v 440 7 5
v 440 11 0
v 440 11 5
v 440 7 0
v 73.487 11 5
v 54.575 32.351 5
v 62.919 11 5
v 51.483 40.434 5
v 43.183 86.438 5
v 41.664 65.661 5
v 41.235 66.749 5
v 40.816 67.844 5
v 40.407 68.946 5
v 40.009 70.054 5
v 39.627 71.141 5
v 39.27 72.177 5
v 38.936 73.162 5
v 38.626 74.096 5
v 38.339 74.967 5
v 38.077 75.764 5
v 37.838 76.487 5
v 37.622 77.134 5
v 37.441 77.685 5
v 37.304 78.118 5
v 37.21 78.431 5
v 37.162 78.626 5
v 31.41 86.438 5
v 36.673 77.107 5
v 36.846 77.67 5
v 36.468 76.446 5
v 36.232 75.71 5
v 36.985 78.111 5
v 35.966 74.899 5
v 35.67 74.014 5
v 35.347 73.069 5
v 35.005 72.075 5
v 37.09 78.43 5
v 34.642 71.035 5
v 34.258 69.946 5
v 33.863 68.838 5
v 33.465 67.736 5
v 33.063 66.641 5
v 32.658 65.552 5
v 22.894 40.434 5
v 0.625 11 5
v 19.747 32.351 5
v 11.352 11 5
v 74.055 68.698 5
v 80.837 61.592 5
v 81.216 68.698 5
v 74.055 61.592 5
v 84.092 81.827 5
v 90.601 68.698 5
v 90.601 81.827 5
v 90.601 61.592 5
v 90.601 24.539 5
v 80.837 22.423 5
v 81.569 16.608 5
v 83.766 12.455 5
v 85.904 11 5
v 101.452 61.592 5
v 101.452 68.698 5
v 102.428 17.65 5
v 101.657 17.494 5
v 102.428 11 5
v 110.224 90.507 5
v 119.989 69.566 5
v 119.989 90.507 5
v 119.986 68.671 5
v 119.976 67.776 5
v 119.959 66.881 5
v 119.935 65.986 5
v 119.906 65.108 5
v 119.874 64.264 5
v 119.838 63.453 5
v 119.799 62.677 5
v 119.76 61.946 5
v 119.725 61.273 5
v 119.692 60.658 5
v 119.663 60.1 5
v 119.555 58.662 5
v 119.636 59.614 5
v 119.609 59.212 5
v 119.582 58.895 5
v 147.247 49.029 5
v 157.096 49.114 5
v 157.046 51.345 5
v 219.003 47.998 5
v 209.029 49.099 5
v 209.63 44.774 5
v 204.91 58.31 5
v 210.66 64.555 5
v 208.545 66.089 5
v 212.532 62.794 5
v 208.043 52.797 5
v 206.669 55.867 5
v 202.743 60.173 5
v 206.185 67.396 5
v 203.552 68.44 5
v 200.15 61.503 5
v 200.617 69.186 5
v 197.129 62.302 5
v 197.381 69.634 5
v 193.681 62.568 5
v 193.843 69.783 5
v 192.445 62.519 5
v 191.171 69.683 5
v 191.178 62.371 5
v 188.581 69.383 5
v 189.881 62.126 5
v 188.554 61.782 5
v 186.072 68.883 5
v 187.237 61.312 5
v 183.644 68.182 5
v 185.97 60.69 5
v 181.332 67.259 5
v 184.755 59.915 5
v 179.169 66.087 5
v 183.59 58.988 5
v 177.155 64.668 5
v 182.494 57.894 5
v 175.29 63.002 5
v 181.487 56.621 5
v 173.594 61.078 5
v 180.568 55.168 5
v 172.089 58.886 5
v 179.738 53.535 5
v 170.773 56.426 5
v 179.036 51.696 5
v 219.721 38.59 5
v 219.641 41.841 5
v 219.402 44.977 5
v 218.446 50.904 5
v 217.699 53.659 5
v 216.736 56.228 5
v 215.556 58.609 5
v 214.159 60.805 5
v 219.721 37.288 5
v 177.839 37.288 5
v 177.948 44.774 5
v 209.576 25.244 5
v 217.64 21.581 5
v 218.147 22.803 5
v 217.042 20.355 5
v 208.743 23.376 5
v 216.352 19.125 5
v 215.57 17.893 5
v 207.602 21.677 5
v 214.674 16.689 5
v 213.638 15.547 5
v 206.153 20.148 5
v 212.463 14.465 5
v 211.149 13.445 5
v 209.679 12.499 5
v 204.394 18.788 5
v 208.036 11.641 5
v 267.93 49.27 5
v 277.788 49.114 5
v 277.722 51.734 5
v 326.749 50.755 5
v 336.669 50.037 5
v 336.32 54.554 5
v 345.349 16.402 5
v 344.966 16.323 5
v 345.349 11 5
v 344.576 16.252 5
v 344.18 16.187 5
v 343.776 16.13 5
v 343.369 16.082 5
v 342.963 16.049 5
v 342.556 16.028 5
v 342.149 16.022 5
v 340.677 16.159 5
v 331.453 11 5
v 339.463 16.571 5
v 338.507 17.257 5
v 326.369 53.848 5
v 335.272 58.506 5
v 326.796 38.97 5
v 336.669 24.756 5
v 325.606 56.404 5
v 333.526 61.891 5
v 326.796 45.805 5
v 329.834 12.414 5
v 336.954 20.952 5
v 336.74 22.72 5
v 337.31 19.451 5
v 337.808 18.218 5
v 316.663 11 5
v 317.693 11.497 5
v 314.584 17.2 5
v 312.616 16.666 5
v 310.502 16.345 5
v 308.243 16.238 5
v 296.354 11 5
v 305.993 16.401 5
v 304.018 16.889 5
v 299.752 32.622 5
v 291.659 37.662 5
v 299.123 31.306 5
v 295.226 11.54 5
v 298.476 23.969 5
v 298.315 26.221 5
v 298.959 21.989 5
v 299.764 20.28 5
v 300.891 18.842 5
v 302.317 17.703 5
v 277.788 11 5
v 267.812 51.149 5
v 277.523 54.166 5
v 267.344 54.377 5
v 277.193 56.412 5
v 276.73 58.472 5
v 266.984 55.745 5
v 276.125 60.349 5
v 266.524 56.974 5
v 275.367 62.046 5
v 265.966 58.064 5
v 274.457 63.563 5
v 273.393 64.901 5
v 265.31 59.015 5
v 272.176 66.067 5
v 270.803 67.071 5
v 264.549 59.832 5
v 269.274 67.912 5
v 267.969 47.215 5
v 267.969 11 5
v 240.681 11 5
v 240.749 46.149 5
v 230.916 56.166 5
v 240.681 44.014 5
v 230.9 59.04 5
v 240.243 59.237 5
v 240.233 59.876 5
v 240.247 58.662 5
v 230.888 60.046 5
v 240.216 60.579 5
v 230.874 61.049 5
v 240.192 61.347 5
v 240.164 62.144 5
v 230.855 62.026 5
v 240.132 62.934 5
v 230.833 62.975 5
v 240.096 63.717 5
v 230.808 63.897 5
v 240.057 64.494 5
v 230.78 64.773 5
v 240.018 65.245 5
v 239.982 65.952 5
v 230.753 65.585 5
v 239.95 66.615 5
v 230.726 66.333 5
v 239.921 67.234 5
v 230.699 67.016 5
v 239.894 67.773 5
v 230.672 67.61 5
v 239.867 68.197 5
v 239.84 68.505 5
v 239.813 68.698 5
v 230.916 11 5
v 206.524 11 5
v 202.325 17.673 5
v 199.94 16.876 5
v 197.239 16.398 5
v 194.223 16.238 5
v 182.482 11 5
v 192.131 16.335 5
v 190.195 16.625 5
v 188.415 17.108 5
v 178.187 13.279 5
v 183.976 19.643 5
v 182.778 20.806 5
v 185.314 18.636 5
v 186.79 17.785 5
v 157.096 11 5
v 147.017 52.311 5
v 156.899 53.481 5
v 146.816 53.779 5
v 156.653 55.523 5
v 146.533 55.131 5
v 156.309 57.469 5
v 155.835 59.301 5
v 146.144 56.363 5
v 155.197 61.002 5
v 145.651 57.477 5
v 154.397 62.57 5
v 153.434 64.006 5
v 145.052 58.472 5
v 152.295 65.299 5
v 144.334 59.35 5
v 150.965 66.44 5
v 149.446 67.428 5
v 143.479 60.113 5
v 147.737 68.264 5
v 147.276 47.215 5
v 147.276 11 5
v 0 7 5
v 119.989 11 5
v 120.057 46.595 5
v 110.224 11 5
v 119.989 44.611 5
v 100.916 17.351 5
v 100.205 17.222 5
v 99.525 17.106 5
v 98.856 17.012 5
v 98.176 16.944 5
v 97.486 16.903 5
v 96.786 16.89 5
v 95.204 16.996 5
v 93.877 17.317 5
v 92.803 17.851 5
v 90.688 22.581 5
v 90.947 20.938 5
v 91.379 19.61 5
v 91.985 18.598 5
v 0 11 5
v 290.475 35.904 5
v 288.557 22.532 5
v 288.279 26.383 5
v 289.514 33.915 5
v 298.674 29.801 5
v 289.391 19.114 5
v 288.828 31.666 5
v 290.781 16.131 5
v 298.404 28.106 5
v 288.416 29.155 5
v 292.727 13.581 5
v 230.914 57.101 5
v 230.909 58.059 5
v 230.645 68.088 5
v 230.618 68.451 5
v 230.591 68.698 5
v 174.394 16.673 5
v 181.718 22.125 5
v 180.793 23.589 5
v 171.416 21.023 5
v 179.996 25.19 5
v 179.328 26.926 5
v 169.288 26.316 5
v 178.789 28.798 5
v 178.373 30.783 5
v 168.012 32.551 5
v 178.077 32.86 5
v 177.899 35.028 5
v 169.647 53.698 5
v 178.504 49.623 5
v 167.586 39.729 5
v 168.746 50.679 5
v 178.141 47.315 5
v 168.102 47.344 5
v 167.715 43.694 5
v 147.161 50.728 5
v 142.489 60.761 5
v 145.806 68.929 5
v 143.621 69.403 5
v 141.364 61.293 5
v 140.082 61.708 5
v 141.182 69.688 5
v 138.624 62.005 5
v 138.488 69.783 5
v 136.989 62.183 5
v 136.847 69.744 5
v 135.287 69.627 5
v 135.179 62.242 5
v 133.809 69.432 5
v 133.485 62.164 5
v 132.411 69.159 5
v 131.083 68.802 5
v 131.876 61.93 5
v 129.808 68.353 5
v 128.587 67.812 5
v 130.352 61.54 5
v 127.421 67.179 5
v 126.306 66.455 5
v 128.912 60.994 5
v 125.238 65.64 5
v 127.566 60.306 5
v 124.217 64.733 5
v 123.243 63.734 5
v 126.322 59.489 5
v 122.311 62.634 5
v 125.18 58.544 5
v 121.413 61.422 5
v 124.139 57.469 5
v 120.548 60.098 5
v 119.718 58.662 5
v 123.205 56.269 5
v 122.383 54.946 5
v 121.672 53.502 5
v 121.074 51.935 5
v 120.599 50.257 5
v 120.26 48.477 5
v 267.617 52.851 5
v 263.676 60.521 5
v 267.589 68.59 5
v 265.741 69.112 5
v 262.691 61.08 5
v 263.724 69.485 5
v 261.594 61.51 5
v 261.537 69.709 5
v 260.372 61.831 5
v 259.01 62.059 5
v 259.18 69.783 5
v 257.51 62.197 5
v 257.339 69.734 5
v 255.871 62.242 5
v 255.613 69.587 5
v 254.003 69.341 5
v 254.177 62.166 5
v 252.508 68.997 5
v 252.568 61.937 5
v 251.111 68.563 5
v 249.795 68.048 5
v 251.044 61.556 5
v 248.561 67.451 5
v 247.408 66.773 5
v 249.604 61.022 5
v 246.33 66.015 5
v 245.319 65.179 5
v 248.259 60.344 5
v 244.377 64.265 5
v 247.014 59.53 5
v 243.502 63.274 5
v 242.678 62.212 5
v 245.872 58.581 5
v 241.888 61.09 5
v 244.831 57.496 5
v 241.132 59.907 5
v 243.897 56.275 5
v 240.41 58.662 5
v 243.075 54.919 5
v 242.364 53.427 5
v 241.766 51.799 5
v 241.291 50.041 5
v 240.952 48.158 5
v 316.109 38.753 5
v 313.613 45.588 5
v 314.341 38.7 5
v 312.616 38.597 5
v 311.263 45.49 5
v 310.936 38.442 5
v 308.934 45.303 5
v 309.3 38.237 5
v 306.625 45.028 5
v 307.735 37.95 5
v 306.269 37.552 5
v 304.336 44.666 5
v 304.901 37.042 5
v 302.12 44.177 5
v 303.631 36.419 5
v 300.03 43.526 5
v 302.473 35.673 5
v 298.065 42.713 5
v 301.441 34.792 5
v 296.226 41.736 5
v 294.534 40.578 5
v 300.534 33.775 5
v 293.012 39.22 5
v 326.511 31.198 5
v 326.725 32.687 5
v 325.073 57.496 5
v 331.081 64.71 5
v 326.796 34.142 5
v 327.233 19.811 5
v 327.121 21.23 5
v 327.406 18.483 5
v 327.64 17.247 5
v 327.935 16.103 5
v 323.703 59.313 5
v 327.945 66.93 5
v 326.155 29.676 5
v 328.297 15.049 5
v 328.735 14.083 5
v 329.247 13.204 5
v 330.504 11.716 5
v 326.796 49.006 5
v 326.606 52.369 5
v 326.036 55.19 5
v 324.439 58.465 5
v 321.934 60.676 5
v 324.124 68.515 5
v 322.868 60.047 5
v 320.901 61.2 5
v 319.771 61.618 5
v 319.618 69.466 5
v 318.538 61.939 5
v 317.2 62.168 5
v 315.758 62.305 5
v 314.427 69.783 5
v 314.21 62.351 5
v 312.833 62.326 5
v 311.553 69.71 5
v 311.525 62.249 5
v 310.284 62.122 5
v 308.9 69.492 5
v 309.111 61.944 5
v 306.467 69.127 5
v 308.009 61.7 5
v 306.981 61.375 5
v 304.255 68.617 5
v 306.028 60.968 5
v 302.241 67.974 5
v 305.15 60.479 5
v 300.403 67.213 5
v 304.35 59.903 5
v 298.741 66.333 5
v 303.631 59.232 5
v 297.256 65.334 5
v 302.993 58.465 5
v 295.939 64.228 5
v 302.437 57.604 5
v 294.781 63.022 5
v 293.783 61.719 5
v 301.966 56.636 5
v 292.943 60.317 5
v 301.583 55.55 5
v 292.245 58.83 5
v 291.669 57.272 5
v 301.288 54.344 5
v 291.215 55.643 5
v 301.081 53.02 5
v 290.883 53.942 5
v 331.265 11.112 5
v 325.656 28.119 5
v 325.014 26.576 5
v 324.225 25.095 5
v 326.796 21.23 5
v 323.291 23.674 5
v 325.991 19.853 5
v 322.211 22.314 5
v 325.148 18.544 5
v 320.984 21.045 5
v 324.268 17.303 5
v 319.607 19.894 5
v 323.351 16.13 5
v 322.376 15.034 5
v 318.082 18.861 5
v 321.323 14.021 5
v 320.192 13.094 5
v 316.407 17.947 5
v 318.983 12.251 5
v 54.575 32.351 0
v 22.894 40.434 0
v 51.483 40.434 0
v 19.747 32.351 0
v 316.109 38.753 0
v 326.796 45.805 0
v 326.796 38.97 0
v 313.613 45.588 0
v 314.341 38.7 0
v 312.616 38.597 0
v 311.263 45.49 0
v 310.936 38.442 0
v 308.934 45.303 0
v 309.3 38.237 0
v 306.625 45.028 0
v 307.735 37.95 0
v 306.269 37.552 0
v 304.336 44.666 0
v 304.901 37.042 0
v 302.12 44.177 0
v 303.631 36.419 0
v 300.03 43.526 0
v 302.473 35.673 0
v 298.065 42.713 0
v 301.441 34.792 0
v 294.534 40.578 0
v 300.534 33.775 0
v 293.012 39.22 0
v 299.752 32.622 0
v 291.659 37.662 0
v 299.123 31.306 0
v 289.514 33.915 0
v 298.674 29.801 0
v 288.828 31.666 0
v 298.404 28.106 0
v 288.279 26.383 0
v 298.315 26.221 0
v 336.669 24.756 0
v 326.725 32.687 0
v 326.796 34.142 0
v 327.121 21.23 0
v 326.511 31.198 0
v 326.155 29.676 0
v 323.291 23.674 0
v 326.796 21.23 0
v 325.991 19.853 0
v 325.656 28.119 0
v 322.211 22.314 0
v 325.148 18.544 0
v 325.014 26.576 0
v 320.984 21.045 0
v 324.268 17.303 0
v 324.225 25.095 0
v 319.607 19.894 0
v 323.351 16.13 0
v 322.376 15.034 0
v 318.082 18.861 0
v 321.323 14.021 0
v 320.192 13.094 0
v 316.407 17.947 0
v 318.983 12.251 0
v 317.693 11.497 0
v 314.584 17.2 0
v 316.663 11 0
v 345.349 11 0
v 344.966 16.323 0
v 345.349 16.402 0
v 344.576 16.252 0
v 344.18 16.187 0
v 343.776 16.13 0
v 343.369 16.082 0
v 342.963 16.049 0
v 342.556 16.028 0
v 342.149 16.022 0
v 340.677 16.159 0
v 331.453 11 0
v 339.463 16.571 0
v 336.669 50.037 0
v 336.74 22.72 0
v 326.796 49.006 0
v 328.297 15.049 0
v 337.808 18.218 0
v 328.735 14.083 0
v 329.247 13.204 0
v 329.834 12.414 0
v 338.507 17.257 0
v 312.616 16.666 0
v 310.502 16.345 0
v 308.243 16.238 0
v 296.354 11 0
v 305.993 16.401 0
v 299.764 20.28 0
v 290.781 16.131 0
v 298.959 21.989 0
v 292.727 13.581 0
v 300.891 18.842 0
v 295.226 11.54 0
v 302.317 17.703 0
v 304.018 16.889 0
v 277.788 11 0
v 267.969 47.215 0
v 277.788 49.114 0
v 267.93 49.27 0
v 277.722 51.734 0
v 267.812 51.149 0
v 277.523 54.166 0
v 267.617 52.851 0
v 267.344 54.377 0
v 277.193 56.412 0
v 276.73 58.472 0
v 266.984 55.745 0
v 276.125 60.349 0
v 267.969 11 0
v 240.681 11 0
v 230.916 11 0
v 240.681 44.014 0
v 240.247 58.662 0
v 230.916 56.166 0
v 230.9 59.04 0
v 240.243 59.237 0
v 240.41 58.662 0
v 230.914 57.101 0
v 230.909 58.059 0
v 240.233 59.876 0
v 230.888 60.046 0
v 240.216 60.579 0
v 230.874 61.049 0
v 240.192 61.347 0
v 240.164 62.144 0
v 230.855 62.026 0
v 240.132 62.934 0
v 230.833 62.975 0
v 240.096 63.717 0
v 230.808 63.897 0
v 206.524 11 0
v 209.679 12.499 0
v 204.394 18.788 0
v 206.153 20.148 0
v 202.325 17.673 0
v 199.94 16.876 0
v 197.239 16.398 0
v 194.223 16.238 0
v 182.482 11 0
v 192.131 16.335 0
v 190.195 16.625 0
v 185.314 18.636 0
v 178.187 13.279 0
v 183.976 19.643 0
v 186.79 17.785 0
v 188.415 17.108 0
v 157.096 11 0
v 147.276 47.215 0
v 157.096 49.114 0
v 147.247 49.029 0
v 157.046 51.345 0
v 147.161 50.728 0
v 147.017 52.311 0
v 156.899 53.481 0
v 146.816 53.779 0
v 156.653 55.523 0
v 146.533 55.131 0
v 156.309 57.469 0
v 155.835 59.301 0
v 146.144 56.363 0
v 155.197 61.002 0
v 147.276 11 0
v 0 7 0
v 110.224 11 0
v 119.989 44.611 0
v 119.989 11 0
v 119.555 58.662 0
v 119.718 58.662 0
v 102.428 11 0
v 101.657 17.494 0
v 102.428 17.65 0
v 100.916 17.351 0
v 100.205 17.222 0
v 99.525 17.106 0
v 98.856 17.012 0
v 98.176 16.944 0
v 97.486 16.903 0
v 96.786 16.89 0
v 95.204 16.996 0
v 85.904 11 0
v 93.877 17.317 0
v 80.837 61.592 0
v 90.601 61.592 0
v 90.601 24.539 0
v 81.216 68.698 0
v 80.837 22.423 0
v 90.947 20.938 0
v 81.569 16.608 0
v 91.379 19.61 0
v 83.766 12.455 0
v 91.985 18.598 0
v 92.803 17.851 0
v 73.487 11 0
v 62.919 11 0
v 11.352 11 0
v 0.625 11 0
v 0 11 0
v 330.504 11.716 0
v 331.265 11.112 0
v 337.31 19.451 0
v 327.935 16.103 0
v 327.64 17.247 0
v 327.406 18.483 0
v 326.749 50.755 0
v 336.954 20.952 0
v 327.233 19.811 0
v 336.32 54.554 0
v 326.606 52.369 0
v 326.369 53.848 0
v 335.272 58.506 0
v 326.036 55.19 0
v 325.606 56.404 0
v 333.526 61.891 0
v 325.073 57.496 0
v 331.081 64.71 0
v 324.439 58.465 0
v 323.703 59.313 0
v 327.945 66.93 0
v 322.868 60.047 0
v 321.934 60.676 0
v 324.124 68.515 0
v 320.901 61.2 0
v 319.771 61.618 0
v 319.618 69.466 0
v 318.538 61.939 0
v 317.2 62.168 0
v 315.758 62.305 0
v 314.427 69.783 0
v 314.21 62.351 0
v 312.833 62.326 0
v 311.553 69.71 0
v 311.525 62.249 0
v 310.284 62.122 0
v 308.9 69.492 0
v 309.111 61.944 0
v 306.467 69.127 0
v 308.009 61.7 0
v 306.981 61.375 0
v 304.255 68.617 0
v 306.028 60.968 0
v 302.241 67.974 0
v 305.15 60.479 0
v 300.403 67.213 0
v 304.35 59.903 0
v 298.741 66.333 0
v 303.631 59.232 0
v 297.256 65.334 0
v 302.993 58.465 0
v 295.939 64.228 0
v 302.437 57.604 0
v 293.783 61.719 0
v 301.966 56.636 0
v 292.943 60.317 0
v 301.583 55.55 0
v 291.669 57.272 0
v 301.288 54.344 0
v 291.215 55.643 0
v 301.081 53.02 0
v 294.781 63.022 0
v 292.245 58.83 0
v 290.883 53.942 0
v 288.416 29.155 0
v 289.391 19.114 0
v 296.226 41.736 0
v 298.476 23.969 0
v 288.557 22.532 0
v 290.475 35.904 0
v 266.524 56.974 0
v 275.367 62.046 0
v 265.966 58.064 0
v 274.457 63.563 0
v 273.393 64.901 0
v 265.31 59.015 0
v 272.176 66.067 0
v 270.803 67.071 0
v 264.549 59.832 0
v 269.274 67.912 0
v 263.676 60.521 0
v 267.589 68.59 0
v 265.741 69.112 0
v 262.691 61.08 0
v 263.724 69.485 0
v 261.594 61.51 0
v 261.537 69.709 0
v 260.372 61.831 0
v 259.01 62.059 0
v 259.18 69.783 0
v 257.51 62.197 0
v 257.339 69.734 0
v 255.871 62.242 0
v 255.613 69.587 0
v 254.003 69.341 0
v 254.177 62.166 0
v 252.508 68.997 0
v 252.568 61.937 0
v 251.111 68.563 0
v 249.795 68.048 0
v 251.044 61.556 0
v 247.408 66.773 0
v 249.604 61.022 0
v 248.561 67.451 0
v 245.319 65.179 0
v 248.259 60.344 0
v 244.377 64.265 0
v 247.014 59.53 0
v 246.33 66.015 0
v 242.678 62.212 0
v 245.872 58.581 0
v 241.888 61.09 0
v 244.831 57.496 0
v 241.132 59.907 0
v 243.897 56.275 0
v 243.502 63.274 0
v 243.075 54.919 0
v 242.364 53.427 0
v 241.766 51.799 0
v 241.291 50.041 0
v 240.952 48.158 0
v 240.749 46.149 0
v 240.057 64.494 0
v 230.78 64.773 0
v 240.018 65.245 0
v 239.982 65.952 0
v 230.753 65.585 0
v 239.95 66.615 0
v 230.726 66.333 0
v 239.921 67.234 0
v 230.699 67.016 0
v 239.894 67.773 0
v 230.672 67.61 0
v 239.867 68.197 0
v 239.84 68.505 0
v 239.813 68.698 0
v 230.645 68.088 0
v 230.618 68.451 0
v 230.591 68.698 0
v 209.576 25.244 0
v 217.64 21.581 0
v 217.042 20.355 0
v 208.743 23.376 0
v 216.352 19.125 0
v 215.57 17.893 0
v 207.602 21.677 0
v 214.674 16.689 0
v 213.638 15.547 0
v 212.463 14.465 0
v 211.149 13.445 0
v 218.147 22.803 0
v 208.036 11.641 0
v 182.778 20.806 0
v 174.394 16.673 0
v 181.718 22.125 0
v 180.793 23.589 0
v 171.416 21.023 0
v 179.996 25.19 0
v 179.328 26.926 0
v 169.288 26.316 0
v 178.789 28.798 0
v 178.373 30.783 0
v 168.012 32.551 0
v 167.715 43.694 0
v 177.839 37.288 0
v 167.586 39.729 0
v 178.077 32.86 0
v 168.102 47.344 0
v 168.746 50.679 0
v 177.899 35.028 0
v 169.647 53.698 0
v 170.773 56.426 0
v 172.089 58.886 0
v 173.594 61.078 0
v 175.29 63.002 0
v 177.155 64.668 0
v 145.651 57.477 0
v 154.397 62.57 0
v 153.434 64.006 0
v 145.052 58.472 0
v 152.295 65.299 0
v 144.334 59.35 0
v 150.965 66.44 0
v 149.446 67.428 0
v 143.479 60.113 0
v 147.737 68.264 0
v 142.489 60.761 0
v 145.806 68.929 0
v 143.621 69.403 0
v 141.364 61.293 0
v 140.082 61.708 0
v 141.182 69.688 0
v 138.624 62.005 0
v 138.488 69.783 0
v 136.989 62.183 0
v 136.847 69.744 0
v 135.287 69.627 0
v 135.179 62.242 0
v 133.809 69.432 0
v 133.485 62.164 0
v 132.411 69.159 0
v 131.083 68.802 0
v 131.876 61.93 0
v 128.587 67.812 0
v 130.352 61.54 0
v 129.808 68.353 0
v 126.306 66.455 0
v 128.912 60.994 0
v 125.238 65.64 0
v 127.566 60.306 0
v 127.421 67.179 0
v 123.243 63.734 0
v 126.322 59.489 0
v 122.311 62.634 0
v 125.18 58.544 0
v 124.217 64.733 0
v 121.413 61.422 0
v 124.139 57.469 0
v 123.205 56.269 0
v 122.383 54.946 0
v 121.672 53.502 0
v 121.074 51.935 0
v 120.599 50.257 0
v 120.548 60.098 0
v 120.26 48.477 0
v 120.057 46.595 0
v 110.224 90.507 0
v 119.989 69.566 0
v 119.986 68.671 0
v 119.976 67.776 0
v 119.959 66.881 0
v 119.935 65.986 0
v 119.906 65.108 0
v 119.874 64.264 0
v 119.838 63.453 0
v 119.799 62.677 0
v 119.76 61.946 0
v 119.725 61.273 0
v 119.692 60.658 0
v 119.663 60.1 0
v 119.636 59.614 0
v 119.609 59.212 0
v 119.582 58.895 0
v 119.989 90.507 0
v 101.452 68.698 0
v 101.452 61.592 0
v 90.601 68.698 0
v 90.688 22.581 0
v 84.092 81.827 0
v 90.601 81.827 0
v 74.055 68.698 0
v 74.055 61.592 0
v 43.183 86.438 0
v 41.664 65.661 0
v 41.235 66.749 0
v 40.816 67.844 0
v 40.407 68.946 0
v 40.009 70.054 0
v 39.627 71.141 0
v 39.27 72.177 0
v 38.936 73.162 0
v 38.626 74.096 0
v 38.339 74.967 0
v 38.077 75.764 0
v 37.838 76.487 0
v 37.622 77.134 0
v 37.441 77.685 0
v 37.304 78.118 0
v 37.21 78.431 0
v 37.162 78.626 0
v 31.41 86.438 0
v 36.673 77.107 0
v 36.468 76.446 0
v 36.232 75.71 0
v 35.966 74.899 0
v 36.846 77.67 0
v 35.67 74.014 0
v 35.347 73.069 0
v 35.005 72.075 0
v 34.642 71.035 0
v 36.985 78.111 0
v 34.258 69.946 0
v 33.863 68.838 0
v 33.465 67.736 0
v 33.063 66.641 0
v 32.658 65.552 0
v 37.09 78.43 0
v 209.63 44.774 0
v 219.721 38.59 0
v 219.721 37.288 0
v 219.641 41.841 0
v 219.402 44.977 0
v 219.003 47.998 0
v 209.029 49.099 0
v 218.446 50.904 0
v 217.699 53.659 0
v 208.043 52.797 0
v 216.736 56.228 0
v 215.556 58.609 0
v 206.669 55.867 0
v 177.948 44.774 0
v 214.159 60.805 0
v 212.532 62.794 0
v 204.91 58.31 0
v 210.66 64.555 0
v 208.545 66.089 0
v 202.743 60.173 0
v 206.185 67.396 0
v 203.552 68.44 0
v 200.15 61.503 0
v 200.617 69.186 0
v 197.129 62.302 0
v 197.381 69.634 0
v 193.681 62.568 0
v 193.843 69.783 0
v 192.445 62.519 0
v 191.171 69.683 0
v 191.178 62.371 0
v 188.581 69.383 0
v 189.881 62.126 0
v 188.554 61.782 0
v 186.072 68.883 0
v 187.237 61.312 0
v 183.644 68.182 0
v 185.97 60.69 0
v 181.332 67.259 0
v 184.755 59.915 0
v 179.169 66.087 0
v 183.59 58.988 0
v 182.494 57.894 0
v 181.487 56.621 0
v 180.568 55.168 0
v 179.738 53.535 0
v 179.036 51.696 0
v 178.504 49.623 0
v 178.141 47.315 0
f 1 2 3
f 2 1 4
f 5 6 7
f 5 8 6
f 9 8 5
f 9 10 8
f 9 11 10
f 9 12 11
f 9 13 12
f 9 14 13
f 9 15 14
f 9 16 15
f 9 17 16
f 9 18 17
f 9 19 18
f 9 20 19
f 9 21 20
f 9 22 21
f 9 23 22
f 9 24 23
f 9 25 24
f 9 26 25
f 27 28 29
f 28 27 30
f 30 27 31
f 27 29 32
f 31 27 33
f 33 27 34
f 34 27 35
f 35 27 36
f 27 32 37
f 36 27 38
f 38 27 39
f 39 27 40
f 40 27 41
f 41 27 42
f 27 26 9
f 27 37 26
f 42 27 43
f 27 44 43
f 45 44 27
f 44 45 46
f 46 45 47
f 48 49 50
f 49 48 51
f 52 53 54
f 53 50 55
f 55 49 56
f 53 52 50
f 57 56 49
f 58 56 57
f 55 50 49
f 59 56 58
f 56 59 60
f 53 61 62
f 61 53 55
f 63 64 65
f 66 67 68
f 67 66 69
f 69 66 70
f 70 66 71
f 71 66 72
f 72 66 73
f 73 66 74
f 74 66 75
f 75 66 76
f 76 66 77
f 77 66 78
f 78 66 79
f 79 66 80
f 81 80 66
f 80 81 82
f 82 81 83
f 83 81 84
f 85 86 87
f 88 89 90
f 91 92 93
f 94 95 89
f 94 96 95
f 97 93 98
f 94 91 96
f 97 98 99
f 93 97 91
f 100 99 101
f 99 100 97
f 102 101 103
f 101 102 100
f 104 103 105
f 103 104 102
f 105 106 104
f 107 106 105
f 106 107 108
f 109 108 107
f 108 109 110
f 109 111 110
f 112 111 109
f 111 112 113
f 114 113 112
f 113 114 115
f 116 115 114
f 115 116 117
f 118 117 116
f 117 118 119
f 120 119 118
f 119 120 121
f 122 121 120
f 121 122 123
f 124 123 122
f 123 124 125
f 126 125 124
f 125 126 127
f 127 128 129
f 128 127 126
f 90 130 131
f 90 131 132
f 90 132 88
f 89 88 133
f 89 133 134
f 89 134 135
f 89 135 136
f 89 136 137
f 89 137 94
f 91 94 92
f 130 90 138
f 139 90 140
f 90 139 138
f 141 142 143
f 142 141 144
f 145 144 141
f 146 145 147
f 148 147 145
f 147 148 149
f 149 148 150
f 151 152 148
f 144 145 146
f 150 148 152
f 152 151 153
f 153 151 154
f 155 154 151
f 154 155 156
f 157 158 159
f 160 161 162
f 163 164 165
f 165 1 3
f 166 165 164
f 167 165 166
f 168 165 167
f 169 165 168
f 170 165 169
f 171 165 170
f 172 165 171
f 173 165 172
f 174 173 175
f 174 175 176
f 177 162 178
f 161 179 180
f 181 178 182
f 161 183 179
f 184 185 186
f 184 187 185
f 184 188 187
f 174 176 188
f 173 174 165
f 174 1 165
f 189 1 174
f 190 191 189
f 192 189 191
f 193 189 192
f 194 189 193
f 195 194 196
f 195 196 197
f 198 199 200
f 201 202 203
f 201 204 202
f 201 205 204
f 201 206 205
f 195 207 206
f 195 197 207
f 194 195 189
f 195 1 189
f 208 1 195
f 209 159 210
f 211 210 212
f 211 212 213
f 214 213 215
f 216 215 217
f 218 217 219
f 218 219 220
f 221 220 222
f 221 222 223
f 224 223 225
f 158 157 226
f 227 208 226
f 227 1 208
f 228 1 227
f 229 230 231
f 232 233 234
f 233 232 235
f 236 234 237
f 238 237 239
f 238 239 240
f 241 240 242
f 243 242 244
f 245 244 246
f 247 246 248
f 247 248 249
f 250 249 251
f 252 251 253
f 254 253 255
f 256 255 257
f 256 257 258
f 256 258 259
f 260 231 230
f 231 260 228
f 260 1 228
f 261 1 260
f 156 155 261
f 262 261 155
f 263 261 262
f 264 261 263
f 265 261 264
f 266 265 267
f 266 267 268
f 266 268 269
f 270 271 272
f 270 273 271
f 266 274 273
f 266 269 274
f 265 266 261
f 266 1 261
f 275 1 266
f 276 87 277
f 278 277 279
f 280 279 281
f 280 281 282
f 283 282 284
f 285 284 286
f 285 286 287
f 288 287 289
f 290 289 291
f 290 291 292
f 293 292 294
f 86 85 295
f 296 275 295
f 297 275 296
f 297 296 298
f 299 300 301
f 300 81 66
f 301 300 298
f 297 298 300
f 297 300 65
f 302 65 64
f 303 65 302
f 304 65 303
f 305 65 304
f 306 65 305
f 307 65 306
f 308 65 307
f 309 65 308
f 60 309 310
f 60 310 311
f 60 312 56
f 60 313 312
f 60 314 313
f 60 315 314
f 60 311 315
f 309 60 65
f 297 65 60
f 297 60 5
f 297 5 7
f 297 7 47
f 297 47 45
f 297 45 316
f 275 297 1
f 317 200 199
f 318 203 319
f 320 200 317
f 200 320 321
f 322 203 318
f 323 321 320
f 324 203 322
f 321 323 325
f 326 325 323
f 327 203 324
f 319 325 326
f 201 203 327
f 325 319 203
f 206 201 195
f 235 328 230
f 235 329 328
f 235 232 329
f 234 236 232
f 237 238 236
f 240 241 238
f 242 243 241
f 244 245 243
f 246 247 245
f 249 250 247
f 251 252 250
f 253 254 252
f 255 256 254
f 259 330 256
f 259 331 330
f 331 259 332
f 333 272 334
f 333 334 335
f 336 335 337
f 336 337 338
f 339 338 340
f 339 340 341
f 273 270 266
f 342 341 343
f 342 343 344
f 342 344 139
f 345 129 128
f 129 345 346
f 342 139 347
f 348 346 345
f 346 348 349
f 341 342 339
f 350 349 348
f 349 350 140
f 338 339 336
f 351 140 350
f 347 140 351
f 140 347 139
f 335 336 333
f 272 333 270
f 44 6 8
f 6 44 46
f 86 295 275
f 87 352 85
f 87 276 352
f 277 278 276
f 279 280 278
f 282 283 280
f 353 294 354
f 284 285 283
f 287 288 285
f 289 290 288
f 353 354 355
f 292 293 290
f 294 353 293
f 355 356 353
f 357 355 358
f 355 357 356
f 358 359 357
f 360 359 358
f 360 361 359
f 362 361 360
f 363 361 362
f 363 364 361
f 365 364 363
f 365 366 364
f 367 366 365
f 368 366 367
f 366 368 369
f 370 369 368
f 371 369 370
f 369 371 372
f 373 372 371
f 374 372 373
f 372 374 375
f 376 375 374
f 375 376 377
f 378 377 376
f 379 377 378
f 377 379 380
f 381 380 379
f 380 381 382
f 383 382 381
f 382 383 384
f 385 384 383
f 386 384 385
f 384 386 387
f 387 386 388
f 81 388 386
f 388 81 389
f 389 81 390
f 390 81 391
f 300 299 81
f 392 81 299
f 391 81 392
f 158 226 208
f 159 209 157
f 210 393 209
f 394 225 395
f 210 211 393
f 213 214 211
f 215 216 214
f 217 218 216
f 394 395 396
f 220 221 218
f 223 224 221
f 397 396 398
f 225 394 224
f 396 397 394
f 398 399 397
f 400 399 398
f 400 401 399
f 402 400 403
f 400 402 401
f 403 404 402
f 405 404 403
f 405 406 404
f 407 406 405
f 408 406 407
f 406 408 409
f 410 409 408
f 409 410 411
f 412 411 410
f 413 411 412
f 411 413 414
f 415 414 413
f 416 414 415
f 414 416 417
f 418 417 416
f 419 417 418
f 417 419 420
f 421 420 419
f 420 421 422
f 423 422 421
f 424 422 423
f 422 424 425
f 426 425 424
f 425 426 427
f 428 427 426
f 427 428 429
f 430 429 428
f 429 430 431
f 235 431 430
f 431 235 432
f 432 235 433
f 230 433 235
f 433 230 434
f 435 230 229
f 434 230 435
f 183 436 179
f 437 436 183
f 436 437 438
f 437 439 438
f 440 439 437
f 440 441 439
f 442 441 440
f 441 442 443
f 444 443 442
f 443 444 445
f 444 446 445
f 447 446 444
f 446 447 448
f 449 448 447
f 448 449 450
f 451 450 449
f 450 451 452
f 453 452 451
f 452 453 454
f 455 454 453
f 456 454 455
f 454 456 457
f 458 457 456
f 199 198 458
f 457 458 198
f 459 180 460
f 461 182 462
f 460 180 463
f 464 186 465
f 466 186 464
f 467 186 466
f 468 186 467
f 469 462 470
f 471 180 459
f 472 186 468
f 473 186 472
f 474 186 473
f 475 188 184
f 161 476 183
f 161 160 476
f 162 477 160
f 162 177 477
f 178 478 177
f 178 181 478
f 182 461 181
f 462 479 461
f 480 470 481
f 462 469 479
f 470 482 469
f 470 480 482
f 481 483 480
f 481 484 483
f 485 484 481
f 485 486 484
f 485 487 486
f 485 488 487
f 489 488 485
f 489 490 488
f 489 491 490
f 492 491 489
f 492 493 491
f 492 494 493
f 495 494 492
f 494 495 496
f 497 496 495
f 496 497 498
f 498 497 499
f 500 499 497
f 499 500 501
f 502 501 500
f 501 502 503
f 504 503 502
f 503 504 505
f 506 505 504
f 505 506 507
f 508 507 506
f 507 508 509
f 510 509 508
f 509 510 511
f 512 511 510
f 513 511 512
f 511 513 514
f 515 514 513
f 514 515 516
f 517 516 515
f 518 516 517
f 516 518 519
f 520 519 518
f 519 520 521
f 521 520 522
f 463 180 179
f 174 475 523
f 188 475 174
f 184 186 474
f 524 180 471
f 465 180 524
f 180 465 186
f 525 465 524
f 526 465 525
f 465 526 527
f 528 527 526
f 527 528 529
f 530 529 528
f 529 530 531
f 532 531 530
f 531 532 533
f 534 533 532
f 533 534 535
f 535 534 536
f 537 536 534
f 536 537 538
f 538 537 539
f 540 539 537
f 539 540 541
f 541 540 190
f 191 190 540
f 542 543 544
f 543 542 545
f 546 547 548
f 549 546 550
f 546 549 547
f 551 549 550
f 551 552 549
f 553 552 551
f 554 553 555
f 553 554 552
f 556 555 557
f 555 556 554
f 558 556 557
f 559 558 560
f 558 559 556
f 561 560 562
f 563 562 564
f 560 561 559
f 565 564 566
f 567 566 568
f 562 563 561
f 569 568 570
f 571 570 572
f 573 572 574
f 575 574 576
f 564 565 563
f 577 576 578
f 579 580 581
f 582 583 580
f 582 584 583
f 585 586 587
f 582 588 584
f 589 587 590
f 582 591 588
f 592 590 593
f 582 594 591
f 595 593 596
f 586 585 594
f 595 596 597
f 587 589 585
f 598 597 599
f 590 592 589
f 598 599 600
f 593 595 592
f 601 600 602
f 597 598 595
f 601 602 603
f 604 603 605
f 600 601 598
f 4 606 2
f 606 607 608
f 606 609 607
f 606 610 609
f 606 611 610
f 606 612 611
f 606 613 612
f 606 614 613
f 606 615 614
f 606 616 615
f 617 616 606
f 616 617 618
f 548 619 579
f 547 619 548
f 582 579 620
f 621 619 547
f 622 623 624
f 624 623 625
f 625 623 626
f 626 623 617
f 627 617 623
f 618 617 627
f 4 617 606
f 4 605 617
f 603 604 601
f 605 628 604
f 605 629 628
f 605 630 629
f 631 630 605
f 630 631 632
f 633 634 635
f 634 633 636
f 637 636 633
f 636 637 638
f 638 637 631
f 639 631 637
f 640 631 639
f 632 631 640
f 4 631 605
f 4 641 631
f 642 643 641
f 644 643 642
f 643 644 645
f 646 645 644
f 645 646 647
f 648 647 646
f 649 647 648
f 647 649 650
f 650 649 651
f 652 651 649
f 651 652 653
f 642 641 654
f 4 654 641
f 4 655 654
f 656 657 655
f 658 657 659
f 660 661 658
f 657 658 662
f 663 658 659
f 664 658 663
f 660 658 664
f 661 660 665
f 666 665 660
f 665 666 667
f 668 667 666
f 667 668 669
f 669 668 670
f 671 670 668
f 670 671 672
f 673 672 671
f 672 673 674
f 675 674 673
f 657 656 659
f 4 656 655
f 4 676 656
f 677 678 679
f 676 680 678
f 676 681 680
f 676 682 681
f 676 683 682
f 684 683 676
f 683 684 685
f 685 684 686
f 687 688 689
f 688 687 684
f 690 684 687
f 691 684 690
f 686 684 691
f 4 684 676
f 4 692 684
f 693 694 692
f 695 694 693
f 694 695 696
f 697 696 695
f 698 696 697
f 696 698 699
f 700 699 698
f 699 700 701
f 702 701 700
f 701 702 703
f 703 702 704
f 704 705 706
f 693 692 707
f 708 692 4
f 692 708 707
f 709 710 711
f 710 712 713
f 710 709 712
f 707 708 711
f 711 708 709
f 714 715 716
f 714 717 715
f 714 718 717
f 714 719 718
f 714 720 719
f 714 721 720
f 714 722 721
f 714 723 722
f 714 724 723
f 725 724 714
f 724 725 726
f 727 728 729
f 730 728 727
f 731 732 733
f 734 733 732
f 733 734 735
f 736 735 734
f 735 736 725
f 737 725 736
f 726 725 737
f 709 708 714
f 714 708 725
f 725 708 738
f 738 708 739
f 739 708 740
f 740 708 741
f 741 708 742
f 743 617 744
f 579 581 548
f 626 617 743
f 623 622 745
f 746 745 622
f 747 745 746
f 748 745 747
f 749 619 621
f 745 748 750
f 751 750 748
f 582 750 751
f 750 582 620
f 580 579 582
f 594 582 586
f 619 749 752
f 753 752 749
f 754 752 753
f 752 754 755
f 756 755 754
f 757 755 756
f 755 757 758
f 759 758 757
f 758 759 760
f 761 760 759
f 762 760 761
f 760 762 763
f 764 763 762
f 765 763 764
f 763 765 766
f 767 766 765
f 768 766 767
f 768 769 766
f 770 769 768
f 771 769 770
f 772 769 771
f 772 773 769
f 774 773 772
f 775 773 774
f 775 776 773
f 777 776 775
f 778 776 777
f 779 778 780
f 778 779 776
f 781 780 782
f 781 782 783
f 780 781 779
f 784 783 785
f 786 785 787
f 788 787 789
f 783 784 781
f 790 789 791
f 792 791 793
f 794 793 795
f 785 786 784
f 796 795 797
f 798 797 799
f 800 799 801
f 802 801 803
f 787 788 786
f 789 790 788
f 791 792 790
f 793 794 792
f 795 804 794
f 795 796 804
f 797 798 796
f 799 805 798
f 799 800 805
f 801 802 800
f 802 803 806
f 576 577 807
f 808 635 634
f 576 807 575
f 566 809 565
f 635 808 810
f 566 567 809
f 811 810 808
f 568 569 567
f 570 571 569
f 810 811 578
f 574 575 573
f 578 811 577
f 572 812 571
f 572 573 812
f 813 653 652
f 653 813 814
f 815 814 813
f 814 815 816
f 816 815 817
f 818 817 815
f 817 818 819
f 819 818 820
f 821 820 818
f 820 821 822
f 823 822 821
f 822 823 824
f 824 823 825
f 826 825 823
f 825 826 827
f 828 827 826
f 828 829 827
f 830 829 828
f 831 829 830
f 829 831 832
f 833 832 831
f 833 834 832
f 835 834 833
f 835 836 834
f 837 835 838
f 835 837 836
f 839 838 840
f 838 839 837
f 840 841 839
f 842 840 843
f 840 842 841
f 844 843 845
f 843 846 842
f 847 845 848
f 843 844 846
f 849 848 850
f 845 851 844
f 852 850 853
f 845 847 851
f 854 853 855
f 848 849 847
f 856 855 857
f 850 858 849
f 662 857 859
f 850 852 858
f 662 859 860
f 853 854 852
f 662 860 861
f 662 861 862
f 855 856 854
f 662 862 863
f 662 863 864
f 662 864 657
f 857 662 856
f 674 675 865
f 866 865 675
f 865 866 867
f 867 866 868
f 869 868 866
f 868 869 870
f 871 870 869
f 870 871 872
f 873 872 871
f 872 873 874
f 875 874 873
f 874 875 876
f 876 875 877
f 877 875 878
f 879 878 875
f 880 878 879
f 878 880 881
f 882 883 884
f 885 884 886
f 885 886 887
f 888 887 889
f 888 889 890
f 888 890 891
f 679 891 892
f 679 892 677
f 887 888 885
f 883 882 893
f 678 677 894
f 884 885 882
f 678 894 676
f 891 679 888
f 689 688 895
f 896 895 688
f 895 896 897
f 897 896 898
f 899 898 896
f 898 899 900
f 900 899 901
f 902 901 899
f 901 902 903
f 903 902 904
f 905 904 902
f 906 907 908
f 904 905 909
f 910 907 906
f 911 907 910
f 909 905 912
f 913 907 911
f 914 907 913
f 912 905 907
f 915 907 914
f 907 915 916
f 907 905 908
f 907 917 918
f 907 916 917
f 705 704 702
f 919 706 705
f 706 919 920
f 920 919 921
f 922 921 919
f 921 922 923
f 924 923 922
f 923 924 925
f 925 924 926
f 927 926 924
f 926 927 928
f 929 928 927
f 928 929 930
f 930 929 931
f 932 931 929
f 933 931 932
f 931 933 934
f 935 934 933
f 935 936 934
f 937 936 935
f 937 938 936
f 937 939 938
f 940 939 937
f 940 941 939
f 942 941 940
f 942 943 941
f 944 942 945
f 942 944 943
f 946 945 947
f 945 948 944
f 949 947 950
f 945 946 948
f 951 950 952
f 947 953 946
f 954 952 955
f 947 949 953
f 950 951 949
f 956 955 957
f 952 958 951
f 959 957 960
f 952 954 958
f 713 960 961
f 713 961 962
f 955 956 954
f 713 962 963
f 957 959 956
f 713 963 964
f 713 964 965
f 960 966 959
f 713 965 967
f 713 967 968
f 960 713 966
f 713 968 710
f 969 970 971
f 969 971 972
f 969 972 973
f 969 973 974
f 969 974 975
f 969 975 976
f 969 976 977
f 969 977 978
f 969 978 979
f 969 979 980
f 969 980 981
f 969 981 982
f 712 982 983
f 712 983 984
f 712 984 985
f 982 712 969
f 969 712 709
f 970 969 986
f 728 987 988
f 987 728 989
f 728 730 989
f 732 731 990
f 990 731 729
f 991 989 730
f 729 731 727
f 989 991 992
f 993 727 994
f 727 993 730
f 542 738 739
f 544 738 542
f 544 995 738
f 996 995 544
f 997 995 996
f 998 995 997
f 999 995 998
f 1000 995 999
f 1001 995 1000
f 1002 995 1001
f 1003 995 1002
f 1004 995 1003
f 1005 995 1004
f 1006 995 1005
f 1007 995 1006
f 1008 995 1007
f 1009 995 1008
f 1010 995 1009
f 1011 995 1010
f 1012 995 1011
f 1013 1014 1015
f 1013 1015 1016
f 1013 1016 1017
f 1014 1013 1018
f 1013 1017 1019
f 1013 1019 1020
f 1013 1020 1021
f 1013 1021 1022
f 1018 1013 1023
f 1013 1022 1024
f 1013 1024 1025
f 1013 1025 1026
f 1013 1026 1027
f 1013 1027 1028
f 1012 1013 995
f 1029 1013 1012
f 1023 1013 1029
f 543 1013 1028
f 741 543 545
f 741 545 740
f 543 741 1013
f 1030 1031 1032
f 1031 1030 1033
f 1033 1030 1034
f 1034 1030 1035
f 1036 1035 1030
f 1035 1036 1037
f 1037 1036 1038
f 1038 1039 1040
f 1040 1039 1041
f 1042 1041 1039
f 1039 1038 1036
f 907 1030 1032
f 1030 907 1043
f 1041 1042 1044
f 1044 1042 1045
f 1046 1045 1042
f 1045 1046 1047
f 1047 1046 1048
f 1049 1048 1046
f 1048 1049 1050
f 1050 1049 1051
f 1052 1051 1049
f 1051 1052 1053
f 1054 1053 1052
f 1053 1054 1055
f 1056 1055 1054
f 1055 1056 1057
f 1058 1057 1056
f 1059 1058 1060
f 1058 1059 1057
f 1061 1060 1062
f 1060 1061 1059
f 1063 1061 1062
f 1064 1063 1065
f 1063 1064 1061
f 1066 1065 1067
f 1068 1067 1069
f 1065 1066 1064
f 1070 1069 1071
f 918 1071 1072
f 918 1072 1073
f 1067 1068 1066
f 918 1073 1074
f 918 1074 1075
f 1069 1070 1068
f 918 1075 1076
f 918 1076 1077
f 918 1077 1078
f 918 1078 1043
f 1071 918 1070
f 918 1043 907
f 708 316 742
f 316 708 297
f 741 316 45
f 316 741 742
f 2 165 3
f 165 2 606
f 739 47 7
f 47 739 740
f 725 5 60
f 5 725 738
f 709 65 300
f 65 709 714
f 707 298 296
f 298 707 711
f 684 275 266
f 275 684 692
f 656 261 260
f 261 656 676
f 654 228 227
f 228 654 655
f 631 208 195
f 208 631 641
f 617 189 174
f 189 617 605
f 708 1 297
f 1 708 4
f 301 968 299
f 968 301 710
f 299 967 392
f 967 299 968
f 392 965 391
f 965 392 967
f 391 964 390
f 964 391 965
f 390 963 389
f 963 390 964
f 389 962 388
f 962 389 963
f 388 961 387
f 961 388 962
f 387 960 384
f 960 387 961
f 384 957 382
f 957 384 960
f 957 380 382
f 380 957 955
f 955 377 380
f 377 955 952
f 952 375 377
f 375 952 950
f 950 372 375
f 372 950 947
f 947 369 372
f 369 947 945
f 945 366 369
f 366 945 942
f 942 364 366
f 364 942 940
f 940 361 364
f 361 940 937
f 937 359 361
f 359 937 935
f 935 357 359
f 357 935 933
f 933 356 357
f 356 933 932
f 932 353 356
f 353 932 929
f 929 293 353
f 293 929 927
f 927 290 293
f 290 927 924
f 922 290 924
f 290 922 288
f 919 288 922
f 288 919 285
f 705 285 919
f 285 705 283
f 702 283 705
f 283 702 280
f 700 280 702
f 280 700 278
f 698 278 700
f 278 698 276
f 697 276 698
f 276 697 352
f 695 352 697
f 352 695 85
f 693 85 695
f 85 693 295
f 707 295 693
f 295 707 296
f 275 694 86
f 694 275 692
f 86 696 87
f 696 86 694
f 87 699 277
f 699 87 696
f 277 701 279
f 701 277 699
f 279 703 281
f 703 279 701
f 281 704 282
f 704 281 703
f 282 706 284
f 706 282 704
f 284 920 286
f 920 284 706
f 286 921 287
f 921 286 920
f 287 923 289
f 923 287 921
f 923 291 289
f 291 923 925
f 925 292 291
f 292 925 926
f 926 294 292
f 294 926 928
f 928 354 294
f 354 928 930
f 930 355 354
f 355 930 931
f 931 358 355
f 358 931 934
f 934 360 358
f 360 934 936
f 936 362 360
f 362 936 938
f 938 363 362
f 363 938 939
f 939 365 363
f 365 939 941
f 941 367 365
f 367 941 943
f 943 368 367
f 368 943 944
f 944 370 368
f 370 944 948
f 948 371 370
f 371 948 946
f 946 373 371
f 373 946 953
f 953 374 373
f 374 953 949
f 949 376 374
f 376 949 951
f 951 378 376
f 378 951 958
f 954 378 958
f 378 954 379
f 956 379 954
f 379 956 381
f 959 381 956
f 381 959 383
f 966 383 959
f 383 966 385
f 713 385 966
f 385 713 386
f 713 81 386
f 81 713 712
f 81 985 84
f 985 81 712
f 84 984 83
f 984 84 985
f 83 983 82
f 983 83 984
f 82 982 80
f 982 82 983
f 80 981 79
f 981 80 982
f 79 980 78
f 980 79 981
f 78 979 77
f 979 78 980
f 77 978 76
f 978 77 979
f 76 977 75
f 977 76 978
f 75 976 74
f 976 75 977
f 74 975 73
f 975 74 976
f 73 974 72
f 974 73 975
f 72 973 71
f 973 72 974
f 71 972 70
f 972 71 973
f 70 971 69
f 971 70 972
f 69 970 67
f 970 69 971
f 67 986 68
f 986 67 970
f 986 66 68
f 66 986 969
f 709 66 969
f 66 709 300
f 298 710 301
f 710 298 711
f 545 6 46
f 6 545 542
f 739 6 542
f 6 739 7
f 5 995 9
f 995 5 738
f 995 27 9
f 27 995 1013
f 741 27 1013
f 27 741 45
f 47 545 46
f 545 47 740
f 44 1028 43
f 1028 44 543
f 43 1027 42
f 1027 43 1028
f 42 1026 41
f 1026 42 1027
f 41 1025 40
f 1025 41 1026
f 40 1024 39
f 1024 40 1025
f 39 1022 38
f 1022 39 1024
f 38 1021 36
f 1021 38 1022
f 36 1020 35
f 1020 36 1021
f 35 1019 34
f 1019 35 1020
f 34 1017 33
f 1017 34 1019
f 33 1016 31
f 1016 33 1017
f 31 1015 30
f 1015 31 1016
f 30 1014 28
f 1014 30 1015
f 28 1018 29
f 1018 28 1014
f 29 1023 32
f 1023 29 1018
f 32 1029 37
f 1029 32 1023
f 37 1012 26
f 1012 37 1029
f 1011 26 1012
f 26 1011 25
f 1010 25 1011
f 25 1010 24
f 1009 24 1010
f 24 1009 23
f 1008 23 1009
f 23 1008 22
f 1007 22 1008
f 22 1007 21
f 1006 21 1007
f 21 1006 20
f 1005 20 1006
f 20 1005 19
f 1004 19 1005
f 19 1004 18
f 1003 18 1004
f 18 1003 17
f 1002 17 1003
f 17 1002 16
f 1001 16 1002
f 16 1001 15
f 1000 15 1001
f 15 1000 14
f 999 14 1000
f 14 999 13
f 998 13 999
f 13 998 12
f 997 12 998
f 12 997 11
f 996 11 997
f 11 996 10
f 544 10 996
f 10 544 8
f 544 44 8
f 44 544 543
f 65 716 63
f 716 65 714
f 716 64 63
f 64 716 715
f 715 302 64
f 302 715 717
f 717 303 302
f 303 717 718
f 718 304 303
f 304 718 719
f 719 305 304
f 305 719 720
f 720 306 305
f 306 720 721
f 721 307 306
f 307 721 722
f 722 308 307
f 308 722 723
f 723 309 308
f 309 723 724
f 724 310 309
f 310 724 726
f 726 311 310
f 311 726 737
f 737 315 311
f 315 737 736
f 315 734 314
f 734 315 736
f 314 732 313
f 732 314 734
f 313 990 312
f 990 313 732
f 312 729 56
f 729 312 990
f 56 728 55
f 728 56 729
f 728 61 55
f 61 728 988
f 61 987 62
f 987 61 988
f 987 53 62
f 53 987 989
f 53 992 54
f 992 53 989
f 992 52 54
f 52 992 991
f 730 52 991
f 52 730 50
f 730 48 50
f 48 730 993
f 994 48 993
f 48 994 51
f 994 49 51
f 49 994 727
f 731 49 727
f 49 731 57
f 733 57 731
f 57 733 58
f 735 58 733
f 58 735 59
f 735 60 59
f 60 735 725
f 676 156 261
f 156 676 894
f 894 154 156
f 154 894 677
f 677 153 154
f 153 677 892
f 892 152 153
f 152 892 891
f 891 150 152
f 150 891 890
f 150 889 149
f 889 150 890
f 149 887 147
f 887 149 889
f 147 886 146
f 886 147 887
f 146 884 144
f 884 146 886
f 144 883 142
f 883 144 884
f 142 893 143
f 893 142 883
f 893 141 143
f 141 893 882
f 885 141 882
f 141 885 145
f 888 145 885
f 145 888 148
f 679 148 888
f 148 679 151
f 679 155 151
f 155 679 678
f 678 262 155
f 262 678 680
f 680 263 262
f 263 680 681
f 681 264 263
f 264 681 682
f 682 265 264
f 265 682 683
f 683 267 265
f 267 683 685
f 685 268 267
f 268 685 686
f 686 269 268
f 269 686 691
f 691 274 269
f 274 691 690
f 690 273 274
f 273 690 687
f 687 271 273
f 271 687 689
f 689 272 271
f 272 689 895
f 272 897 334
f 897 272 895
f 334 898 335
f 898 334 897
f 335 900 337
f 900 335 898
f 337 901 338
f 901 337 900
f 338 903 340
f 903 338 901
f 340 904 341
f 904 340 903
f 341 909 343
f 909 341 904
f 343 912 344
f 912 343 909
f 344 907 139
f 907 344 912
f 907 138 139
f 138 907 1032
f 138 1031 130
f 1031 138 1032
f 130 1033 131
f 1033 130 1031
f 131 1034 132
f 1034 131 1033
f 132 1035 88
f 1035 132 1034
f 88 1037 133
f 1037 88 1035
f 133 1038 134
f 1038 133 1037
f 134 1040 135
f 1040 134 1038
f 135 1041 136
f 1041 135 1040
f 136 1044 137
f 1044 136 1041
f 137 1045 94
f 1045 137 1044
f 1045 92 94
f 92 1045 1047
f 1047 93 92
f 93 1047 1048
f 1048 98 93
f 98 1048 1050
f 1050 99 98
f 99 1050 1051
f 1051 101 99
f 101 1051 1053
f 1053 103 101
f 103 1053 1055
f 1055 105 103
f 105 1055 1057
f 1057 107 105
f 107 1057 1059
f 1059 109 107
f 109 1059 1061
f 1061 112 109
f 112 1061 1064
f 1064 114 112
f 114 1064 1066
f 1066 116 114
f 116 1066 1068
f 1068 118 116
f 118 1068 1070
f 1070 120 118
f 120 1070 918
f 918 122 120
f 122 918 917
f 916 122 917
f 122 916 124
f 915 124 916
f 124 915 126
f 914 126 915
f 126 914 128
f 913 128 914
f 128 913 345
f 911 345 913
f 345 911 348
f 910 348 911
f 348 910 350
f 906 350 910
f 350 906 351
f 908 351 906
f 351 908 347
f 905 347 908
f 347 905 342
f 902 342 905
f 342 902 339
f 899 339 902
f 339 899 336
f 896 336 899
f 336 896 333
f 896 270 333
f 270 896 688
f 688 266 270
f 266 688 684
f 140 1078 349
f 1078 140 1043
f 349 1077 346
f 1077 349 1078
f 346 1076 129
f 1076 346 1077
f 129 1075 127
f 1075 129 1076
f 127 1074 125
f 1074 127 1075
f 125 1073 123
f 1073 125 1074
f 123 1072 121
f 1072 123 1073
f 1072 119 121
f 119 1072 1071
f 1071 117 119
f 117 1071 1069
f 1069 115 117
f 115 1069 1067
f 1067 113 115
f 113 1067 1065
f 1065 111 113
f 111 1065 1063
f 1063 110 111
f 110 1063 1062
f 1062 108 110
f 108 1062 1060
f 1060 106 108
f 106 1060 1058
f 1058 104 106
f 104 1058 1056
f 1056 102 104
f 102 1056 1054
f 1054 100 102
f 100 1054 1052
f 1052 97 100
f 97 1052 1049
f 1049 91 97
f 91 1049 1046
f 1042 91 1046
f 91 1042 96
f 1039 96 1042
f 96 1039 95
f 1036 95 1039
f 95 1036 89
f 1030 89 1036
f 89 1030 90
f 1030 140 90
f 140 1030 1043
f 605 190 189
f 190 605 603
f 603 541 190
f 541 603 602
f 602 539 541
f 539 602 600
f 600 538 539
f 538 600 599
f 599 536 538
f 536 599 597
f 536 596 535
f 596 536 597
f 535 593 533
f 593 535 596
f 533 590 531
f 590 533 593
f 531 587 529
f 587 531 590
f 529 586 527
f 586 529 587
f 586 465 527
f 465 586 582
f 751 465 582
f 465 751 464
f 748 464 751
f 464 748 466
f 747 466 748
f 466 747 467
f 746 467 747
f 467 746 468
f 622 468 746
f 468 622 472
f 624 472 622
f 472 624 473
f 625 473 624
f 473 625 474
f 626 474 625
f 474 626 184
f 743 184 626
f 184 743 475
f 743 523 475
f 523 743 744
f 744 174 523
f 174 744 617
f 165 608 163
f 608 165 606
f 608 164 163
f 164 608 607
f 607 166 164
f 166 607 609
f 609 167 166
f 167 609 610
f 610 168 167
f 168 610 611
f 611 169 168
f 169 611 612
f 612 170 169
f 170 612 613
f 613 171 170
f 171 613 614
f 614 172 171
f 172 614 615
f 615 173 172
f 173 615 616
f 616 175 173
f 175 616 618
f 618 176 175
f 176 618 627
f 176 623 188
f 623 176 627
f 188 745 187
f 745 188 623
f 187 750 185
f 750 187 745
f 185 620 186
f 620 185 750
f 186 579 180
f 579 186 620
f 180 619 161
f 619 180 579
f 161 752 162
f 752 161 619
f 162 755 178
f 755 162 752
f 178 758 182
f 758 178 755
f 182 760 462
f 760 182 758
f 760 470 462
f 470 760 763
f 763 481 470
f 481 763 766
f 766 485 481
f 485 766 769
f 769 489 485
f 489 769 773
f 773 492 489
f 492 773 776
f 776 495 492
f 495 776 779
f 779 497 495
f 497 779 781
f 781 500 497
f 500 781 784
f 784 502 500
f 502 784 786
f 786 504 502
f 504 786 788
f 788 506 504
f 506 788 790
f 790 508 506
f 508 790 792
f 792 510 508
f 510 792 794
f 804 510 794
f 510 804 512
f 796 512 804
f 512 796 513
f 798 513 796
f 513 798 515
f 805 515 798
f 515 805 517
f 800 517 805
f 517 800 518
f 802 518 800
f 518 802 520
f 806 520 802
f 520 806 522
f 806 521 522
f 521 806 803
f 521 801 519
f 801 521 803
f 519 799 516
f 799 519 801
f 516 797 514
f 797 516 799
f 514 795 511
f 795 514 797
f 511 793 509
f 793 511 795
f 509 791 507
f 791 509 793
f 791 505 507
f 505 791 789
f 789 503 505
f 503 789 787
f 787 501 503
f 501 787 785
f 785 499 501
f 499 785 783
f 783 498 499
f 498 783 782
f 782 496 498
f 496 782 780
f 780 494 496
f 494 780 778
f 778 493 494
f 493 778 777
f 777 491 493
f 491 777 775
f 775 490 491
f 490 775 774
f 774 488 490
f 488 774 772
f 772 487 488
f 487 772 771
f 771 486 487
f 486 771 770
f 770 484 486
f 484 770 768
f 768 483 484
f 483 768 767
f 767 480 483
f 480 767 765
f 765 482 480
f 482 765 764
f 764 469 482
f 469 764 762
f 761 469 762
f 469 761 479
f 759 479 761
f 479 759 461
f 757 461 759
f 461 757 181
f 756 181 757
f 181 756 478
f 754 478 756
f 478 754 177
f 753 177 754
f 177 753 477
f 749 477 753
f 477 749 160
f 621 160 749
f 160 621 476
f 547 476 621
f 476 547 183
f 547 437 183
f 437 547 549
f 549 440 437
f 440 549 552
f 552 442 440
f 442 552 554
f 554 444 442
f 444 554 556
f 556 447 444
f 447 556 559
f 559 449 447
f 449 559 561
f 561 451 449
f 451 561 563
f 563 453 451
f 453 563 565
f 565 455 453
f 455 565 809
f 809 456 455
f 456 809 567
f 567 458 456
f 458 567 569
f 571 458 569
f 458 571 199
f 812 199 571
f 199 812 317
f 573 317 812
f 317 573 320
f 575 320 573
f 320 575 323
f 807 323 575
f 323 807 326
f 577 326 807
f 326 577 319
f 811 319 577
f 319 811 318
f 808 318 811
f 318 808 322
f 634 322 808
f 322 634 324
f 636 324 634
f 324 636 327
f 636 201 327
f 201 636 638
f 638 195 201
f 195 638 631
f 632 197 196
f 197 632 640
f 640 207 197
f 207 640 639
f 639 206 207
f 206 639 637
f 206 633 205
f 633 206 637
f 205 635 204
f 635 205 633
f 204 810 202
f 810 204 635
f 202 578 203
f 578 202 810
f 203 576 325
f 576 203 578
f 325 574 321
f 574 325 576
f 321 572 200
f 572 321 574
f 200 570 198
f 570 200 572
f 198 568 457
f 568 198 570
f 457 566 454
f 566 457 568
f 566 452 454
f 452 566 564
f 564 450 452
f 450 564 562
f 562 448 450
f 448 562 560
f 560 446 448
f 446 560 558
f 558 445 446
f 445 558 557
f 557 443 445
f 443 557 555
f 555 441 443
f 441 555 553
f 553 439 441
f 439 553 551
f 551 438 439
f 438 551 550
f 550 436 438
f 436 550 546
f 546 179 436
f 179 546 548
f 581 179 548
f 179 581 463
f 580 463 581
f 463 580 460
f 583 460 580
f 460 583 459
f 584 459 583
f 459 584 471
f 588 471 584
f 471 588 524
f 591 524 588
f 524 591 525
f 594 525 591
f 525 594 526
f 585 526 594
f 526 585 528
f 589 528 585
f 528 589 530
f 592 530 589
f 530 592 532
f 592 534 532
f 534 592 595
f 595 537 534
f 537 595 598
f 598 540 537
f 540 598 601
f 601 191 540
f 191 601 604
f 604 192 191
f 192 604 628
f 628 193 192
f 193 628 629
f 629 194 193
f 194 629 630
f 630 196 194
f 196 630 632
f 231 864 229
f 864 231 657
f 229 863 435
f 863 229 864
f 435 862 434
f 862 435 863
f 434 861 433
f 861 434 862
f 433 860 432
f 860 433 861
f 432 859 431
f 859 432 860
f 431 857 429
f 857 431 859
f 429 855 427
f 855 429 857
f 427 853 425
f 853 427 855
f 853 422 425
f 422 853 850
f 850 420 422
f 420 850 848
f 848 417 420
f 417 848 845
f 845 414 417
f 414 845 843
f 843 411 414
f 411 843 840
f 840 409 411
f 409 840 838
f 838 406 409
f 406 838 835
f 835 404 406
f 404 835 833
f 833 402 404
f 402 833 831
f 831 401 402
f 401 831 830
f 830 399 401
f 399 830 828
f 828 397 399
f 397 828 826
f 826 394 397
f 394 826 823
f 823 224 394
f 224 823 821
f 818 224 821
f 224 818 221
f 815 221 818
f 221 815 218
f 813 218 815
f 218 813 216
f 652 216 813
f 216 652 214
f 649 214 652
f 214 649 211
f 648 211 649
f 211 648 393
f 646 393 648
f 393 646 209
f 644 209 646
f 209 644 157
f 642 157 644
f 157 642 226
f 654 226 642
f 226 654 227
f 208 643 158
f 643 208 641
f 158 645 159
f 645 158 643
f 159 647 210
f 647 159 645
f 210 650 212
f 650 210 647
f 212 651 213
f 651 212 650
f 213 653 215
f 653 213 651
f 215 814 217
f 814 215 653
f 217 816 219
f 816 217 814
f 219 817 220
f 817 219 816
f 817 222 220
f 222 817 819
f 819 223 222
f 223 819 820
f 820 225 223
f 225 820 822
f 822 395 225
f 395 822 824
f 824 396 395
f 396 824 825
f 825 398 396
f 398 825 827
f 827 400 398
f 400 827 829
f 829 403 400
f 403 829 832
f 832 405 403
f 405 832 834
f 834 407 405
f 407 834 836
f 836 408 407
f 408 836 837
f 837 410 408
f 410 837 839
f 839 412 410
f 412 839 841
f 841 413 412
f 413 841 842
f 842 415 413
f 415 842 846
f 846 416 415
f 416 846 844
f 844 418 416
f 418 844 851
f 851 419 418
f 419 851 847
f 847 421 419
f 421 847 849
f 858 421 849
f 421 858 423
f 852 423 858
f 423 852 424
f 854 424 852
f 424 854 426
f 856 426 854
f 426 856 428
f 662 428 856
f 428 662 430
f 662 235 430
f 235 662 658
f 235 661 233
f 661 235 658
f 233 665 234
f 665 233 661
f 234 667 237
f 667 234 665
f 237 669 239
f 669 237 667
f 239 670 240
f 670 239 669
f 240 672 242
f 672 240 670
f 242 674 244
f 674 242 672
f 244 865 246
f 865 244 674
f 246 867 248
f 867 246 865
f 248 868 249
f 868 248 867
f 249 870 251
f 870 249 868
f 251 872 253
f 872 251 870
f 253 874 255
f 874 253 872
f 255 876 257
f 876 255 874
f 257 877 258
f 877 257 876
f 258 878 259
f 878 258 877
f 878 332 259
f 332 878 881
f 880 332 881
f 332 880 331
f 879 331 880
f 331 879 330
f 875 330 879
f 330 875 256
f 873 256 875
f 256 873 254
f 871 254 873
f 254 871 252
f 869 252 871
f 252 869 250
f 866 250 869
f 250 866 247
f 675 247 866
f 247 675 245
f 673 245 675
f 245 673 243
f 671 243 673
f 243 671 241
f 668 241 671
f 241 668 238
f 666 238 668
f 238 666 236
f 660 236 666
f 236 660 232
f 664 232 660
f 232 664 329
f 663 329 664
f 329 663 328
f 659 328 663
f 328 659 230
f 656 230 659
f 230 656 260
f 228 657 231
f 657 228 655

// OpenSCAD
logo_base_size=454;
logo_base_height=logo_base_size*.20;

pillar_z_offset = 2;
pillar_7_x_scale = .25;
pillar_7_z_scale =  5;

pillar_spacing = .1;
pillar_vs_base_scaling_factor = .65;

normal_pillar_base = .15;
wide_pillar_base = .25;



%cube([logo_base_size, logo_base_height,1.6]);
analytics_pillar_support_height = 230;


text_z=5;

translate([0,7,0])
cube([440,4,text_z]);

translate([0,10,0])
linear_extrude(height = text_z)
text("Athena", font = "Liberation Sans", size=80);
        
translate([340,-3,0])
resize([80,80])
linear_extrude(height = text_z)
import("/Users/virtuoso/Downloads/Athena_logo_pre_processed.dxf");
